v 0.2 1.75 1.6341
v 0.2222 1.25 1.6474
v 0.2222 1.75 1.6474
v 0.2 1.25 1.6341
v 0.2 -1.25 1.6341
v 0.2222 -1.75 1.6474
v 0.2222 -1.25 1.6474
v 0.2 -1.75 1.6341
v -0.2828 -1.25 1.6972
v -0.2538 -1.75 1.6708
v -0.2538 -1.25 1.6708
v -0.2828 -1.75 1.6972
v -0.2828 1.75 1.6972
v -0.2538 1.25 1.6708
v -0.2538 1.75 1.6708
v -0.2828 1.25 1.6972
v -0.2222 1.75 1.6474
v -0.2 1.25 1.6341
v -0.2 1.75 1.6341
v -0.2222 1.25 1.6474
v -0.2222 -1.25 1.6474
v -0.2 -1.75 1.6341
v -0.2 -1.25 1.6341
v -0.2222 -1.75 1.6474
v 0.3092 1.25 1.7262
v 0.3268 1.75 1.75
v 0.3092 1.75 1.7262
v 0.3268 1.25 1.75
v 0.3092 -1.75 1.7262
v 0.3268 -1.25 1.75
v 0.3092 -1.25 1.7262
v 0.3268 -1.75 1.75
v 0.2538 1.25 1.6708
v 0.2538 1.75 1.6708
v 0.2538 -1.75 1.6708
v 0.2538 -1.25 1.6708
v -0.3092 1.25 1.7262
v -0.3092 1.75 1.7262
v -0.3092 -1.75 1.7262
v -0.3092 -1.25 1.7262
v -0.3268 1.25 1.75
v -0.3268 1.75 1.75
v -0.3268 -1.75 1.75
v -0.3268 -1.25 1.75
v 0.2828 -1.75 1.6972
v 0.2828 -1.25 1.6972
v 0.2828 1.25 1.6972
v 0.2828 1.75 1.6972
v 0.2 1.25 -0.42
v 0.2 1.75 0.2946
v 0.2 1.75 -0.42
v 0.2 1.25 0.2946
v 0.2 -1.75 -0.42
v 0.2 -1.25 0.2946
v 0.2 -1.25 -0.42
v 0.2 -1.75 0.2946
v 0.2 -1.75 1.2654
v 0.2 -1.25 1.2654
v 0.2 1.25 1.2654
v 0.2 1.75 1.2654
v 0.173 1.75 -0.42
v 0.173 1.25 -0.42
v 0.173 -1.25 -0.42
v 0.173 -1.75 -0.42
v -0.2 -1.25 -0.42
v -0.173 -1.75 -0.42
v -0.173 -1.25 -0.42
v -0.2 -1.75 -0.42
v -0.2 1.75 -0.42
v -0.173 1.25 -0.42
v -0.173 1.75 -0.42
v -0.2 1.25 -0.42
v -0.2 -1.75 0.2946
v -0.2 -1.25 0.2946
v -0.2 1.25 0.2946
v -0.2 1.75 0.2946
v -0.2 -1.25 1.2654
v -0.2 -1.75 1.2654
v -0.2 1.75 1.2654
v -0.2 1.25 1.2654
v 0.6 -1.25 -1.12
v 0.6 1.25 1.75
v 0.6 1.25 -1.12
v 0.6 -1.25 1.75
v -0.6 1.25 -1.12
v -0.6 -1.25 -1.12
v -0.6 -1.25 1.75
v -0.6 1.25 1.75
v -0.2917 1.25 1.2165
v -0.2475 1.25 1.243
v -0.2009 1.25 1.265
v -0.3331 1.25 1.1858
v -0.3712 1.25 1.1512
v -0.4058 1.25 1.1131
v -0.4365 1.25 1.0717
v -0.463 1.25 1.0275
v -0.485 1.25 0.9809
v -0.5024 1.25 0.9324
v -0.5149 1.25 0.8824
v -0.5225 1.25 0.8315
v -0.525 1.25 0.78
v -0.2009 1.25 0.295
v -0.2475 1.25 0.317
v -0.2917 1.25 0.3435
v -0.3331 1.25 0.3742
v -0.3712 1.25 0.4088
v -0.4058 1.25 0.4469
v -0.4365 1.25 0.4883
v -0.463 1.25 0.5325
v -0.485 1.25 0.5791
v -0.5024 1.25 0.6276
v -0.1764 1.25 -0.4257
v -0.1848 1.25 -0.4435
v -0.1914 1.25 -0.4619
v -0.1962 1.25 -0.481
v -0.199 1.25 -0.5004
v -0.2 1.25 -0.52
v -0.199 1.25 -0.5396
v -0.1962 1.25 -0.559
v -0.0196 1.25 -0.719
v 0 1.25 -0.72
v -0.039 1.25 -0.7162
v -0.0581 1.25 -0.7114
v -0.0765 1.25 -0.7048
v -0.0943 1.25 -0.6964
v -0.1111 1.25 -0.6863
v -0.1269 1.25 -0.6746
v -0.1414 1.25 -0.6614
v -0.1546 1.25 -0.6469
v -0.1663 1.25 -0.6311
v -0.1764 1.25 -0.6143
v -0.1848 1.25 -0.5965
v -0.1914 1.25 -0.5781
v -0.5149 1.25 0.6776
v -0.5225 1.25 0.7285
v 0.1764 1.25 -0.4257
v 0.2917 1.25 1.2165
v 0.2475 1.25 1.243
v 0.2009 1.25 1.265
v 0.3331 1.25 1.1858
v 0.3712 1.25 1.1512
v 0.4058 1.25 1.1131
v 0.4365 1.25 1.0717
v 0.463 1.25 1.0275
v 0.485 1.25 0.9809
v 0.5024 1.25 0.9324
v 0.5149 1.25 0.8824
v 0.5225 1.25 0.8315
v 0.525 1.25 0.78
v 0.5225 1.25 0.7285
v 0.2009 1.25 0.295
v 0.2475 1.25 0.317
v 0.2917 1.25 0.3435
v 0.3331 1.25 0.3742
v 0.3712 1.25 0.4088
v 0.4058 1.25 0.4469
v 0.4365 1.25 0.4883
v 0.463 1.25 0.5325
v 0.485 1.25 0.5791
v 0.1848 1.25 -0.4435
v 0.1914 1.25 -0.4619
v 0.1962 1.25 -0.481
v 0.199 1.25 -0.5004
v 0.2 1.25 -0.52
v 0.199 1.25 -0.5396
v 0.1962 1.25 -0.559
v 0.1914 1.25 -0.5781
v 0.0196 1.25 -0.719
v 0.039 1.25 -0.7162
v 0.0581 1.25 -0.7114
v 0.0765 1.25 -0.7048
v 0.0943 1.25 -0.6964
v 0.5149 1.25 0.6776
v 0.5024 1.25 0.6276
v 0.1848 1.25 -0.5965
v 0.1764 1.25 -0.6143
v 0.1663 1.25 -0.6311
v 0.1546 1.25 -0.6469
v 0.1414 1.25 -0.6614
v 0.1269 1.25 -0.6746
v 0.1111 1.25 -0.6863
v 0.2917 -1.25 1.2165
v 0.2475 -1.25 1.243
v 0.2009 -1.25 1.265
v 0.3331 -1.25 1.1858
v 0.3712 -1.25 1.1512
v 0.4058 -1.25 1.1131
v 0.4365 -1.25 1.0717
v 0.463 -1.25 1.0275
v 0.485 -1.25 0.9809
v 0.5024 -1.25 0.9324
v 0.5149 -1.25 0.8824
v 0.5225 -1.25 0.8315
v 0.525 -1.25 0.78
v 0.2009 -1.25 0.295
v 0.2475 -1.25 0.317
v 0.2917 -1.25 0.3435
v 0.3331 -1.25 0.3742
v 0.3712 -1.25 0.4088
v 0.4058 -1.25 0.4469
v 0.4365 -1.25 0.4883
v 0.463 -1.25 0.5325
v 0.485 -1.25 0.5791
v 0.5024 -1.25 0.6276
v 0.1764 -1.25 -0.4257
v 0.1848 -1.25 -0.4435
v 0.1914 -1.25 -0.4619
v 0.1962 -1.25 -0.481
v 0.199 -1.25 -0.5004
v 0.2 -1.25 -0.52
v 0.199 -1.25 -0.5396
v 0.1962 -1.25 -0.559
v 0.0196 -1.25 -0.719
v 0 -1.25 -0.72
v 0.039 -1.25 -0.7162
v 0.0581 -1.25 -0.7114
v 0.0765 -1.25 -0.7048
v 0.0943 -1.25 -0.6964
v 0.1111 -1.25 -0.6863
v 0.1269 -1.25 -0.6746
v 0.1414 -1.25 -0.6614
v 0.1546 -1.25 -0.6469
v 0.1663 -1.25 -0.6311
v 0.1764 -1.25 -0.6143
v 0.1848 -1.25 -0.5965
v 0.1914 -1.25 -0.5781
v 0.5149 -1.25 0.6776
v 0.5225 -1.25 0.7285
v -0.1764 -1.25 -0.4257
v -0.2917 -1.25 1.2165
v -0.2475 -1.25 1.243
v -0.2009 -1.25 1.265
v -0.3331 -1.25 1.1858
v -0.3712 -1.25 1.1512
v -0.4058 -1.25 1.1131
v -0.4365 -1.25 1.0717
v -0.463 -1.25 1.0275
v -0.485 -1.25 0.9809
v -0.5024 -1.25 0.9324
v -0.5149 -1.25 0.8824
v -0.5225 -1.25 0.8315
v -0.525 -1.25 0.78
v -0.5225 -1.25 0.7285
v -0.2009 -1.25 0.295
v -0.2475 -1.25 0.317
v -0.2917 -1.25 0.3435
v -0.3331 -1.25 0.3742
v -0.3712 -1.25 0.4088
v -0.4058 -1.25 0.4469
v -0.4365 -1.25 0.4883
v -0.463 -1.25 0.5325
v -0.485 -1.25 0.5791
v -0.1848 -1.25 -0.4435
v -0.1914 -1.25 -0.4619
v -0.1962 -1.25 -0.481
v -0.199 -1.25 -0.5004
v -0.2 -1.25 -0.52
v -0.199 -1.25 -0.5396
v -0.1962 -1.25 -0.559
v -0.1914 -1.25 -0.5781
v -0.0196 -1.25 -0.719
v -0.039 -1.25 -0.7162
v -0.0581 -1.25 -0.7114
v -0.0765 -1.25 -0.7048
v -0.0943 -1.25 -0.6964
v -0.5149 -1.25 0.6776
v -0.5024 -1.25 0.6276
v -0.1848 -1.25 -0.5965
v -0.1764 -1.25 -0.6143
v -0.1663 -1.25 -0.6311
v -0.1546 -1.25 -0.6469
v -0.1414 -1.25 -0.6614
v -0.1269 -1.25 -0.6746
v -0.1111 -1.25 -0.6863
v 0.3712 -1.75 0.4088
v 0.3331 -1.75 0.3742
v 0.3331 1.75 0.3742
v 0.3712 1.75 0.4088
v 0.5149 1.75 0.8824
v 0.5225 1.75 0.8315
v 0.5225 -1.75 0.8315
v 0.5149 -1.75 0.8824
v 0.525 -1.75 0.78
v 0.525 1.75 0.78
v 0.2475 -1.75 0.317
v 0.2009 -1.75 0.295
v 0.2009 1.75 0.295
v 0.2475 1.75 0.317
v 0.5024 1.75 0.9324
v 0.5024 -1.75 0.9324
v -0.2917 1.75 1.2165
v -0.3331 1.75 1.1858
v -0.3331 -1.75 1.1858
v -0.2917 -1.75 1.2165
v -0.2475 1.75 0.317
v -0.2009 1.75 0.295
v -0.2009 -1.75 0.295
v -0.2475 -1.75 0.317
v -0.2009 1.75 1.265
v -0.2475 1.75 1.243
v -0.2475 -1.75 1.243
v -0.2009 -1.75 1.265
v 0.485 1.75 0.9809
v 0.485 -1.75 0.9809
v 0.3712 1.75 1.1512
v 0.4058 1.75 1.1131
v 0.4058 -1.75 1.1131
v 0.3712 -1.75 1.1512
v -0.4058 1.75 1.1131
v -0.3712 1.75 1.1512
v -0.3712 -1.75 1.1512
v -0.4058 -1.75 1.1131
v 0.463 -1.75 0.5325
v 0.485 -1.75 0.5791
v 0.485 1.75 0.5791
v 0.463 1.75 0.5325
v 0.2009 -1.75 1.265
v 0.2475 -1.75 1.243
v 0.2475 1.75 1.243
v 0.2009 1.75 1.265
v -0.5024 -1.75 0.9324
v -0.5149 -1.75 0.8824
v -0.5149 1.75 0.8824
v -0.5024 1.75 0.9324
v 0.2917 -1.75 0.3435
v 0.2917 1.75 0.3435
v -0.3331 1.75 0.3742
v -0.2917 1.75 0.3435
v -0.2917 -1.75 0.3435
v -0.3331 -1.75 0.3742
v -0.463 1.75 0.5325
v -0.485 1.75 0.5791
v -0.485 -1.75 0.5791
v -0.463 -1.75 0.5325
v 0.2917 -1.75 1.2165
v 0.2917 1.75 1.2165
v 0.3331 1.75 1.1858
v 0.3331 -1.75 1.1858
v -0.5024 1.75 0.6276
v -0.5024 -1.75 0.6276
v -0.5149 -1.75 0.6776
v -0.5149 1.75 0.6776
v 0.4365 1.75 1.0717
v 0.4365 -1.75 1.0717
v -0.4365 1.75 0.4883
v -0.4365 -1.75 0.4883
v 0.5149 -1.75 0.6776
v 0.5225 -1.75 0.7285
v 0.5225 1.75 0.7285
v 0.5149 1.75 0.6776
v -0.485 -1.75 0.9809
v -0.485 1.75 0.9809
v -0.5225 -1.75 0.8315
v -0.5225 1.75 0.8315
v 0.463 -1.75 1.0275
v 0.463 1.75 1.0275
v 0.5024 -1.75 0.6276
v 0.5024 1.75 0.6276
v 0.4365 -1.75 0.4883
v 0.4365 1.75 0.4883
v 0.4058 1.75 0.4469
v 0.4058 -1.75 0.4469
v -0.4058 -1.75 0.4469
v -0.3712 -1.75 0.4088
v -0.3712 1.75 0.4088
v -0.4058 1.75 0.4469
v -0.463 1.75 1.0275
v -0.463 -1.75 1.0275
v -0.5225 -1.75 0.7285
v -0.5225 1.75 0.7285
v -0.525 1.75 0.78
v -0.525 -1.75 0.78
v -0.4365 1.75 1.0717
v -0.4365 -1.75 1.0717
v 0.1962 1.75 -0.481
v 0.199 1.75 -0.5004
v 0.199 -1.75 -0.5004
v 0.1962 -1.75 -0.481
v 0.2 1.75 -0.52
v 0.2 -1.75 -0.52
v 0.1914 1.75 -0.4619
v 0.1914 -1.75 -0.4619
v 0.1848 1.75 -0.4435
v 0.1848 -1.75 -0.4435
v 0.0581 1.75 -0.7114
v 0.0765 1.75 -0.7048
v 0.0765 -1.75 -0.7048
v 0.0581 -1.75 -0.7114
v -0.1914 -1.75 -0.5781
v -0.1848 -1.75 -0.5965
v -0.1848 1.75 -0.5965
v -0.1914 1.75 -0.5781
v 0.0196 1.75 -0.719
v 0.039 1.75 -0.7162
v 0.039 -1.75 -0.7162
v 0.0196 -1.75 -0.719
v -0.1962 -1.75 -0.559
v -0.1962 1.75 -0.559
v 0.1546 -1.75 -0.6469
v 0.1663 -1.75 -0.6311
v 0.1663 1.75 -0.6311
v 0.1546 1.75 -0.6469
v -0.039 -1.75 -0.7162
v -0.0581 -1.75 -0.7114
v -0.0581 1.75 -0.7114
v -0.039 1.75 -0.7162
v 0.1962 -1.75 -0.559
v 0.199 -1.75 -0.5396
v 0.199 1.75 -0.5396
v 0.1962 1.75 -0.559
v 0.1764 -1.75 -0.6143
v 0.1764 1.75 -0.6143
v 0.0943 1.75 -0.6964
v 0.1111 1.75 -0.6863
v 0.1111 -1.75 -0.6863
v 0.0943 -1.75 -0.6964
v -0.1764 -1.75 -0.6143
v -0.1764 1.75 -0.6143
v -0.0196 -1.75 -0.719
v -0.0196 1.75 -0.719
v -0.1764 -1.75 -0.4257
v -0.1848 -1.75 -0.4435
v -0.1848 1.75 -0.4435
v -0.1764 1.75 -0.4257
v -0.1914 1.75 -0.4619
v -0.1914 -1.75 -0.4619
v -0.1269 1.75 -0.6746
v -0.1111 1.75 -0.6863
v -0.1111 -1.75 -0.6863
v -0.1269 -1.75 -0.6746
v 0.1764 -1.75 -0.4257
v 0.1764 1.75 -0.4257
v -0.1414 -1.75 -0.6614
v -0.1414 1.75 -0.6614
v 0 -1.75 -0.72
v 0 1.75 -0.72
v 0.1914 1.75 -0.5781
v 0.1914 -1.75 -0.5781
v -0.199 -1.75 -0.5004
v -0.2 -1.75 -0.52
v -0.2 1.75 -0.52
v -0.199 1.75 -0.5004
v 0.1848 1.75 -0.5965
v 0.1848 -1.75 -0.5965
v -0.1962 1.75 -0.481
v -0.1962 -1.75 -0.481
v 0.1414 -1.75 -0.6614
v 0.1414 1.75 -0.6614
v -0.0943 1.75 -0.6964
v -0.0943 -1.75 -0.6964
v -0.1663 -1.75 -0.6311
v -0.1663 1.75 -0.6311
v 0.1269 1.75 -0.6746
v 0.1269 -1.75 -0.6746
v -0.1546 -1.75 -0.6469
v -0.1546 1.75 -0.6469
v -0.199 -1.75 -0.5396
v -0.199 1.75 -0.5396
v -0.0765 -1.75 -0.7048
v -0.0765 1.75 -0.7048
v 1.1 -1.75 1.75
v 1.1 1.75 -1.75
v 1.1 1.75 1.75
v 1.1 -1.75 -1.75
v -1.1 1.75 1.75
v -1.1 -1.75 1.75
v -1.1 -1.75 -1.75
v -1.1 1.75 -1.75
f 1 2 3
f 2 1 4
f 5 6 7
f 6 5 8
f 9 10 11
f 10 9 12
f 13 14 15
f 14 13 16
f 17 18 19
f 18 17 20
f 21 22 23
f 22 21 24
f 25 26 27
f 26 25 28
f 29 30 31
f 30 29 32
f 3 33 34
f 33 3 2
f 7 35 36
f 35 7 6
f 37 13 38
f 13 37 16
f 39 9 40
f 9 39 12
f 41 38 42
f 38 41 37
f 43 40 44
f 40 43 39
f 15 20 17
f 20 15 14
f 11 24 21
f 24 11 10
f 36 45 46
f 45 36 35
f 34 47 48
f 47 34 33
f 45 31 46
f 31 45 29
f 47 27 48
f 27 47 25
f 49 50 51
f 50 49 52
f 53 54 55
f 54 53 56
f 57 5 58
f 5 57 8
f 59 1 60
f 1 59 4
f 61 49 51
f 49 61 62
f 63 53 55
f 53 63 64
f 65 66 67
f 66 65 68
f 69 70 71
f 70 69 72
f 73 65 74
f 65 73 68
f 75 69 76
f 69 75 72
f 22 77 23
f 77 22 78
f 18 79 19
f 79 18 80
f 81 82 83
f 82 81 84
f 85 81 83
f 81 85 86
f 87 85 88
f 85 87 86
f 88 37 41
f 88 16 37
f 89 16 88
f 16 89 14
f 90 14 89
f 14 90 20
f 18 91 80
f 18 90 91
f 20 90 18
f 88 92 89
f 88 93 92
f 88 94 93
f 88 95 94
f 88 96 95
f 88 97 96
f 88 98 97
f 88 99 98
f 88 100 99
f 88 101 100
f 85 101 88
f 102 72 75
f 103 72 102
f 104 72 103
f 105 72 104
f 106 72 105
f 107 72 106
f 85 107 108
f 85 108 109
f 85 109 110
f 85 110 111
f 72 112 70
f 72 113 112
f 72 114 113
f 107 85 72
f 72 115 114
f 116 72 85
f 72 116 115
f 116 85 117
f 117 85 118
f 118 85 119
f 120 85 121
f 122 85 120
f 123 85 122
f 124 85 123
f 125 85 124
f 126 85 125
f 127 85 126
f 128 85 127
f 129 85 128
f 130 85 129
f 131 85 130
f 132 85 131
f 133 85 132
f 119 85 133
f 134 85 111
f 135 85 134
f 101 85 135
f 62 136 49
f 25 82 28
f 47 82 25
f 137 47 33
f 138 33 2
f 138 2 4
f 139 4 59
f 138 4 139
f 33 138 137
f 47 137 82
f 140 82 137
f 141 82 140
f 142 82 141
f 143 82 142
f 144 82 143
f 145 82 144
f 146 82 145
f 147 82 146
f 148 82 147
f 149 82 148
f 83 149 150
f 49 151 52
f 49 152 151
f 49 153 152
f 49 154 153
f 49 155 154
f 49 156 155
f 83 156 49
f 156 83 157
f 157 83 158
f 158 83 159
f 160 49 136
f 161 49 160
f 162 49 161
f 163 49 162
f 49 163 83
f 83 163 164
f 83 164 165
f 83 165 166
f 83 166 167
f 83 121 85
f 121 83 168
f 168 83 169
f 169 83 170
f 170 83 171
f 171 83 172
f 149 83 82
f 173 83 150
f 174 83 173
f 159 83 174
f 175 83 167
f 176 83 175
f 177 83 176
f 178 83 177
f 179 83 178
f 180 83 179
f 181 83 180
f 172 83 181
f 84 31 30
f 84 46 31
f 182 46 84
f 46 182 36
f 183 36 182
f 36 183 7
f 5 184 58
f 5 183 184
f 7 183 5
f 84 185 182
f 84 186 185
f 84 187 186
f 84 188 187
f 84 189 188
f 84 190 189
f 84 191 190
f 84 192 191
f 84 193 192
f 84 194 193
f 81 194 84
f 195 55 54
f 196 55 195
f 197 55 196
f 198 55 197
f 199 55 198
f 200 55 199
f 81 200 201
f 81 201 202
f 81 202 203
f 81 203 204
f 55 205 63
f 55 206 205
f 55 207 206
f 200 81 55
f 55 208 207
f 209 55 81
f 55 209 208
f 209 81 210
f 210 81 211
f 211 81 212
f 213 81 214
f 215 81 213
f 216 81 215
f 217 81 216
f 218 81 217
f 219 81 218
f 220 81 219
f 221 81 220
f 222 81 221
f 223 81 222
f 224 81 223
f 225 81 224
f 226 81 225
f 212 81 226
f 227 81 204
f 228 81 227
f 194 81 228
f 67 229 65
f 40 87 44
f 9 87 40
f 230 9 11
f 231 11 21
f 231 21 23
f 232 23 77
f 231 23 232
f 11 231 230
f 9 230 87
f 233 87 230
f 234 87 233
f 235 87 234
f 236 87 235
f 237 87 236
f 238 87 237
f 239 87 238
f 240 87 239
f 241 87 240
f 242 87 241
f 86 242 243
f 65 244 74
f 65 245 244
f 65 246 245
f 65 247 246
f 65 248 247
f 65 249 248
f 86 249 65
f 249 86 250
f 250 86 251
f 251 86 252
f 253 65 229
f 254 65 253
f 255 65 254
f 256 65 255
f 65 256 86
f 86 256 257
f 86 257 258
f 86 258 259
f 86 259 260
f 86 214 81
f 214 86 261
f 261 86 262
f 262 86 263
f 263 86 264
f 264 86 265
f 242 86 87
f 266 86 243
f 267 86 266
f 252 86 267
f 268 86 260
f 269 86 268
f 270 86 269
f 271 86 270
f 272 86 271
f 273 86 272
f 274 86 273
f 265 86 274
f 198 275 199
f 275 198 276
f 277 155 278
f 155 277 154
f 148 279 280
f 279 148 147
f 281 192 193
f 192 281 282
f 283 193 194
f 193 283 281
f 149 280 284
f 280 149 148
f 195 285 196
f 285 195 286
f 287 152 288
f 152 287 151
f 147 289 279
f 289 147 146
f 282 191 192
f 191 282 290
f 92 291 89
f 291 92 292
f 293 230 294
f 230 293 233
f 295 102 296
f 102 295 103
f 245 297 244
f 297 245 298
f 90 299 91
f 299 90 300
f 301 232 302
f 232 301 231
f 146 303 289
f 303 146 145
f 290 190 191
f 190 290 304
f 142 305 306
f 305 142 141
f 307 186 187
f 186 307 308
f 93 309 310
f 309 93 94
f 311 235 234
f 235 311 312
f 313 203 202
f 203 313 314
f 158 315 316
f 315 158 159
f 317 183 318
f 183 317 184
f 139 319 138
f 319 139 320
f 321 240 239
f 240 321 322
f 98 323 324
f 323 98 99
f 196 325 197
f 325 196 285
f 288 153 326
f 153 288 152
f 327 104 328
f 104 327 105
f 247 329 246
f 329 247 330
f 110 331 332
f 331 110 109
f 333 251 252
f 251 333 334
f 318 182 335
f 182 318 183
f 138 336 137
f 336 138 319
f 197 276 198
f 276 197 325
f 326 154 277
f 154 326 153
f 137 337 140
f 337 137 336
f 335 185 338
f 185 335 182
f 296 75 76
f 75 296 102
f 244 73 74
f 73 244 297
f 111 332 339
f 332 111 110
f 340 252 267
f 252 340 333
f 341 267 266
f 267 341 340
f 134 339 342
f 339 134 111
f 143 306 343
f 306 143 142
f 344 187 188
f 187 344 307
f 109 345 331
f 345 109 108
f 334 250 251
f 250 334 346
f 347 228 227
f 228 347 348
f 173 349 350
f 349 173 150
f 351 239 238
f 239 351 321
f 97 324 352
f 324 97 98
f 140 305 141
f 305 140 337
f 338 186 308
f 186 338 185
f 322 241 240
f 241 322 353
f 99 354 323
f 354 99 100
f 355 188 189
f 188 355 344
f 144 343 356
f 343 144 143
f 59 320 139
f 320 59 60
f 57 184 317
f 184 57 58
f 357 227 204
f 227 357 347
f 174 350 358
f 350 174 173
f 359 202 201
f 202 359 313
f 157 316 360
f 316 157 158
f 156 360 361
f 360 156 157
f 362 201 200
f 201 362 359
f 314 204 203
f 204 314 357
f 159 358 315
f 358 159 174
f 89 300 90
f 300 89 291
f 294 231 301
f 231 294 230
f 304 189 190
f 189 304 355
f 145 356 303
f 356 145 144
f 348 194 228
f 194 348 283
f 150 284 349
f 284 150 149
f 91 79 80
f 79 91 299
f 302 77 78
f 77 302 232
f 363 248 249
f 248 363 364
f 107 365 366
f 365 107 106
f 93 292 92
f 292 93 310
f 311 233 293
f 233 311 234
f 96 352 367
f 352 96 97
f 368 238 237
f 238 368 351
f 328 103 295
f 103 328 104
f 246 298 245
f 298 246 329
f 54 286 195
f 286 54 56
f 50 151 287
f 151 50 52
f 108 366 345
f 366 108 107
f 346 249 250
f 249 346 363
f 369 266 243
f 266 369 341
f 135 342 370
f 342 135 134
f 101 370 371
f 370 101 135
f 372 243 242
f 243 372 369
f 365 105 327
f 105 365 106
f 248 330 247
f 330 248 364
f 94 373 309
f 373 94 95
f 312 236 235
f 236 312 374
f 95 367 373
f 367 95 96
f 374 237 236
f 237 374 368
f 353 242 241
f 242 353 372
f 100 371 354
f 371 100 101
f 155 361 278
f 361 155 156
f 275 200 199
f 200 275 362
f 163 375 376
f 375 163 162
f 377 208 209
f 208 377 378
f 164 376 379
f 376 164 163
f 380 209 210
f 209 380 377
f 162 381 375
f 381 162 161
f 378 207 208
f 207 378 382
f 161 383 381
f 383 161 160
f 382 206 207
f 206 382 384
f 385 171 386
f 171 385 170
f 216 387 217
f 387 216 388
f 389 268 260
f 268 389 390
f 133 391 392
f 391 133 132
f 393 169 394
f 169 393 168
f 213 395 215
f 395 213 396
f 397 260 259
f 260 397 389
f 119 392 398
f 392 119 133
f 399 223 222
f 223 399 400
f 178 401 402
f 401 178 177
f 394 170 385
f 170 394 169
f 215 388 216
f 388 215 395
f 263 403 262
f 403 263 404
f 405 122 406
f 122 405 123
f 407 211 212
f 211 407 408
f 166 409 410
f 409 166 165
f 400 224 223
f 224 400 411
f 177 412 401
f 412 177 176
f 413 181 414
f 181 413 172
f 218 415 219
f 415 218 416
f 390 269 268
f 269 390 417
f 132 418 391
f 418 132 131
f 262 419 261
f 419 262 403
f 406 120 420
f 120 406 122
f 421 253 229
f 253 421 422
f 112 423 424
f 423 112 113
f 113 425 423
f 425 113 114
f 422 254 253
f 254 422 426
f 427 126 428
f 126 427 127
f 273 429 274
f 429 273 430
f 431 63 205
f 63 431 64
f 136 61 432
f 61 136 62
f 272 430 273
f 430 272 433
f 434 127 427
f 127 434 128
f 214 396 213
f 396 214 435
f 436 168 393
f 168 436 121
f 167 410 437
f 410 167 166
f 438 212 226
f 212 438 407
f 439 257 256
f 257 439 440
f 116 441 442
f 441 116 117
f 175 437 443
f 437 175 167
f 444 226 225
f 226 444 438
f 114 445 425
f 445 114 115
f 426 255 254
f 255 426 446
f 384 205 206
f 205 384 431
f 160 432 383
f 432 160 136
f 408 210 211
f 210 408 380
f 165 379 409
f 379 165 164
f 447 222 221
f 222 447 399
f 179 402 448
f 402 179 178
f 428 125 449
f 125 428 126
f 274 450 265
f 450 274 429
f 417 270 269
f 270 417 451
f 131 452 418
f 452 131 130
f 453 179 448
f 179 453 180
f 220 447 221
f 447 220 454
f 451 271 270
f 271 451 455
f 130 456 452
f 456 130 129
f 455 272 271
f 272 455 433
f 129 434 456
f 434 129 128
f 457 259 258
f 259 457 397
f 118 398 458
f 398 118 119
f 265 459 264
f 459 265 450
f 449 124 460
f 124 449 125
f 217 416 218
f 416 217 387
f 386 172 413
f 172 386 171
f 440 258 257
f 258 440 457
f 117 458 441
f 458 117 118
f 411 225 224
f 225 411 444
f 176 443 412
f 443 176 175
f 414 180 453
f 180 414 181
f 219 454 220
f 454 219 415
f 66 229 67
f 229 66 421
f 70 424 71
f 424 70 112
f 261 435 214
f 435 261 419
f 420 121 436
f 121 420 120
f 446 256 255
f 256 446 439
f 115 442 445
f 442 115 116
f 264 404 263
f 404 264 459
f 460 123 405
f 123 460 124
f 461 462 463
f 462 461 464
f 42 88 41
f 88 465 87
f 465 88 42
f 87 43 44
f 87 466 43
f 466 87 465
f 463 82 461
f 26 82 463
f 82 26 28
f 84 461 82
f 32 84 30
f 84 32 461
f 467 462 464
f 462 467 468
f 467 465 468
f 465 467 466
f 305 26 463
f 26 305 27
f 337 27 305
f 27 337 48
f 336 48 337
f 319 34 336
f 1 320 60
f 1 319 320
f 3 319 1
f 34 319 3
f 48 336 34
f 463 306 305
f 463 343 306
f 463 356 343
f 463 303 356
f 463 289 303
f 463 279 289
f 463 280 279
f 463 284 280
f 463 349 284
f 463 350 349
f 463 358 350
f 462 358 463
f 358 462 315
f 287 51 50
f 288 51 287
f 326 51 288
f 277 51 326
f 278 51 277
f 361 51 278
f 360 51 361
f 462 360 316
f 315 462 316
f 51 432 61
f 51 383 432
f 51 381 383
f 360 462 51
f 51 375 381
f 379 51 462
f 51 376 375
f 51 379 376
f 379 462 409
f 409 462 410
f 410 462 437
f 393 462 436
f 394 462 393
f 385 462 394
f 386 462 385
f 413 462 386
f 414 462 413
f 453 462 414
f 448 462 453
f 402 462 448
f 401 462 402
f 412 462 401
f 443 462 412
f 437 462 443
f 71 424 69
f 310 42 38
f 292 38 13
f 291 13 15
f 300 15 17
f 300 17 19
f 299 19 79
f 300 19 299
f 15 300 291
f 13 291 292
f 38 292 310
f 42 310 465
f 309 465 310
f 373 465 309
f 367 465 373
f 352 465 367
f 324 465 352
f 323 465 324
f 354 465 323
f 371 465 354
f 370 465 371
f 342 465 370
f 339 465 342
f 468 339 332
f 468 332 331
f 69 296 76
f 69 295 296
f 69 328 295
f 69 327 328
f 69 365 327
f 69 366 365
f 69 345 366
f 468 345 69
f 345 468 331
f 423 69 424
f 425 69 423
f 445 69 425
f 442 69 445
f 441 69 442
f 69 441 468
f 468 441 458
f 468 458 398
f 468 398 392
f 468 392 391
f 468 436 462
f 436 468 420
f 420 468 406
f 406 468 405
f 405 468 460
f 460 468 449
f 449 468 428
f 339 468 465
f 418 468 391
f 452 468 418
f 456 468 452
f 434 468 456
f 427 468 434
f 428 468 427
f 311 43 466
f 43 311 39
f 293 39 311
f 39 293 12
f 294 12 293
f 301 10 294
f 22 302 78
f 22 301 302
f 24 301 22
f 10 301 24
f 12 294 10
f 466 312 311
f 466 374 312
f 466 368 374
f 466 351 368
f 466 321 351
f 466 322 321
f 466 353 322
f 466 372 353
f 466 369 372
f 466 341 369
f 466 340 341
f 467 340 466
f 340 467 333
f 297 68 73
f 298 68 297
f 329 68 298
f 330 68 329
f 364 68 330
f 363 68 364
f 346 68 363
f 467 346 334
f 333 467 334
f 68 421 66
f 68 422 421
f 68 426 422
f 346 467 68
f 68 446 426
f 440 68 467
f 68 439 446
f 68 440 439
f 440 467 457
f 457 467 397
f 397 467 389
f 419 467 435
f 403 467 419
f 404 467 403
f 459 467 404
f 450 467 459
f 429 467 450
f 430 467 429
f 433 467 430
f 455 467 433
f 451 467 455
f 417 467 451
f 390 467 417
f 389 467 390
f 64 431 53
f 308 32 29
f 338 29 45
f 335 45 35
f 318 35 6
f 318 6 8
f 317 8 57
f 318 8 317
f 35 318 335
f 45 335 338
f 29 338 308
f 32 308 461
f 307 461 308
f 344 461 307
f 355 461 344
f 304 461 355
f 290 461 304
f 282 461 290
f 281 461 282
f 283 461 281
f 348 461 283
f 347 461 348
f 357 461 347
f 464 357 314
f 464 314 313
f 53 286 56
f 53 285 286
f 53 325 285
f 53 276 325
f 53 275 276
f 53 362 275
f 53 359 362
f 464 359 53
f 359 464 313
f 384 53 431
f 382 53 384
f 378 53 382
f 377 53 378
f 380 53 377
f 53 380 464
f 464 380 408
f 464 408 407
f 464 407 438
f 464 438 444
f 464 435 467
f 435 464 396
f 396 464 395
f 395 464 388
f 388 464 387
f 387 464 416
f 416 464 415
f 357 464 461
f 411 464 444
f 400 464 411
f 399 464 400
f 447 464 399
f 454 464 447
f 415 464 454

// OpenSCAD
module coupling_body()
{
	difference() {
	rotate([45,0,0])
	cube([3.8, 1.42 * 1.4, 1.42 * 1.4]);
	translate([0, -1.4, 1.9])
		cube([3.8,3, 2]);
	}
	translate([0,-1.4, 1.4])
		cube([3.8, 0.7,0.5]);

	// End of ARM
	translate([0.25, 0, 1.9])
	difference() {
		cube([0.5, 2.8, 1.0], center = true);
		translate([0,0,2.0])
		rotate([45,0,0])
			cube([0.5, 2.8, 2.8], center = true);
	}
	translate([3.1 + 0.35, 0 , 2.9]) {
		difference() {
		cube([0.7, 2.8, 5.8], center=true);
		translate([0.35, 0, -5.0])
		rotate([0,-15,0])
			cube([0.7, 2.8, 7.8], center=true);
		translate([0, 0, -4.5])
		rotate([45, 0, 0])
			cube([1.1, 5, 1], center=true);
		}
	}
	translate([0.6, 0,5.3])
	difference() {
		cube([6.4, 2.8, 1.0], center=true);
		translate([-4.8,0,0.1])
		rotate([0, -15, 0])
		cube([8.4, 2.8, 1.0], center=true);
	}
}


module test_coupling()
{
	coupling_body();
	translate([3.3 - 2.6,-0.5,5.5])
		cube([1,1, 10]);
}

module nem_pocket_hole(w)
{
	cube([0.4, 4.2, 2.2], center=true);
   translate([0,0,-0.7])
		cube([1.2, w , 2.2], center=true);
	translate([0, 0, 0.6])
	cube([0.4, 4.2, 1], center=true);
	translate([0, 0, 0.1])
		rotate([90,0,0])
			cylinder(h=4.2, r=1.05/2, $fn=64, center=true);
	translate([0, 0, -1.2])
		rotate([90,0,0])
			cylinder(h=4.2, r=0.2, $fn=64, center=true);
	difference() {
		translate([0, 0, 1.3])
			rotate([90,0,0])
				cylinder(h=4.2, r=0.8/2, $fn=64, center=true);
		translate([0,0, 2.6])
			cube([2.3, 4.25, 3], center=true);
	}
	cube([1.2, w, 2.2], center=true);
}

module nem_pocket_body()
{
	cube([3.0, 4, 3.5], center=true);
}


module nem_pocket()
{
	difference()
	{
		nem_pocket_body();
		translate([0,0,0.68])
		nem_pocket_hole(2.5);
	}
}

module nem_pocket_wide()
{
	difference()
	{
		nem_pocket_body();
		translate([0,0,0.68])
		nem_pocket_hole(2.7);
	}
}

module fud_nem_pocket_body(w)
{
	cube([2.2, w + 1, 3.5], center=true);
}


module fud_nem_pocket()
{
	difference()
	{
		fud_nem_pocket_body(2.5);
		translate([0,0,0.68])
		nem_pocket_hole(2.5);
	}
}

module fud_nem_pocket_wide()
{
	difference()
	{
		fud_nem_pocket_body(2.5);
		translate([0,0,0.68])
		nem_pocket_hole(2.7);
	}
}
//nem_pocket();


// Our buffers are 4mm long so the front face of the box
// should be 1mm in front of the buffer beam.
// The centre line of the box should be 4mm above the rai

module nem_close_coupler_arm(a, s)
{
	n = 5;	// Fixme compute this
	cube([1, s, a], center=true);
	translate([0,0, a /2 + n /2])
		difference() {
			union() {
				cube([1, 3, n], center=true);
				translate([0, 0, n/2])
				rotate([0,90,0])
					cylinder(r = 1.5, h=1, center=true, $fn=64);
			}

		}

	// Fixme locate pin correctly
	translate([1.6,0, -n/2])
	rotate([0,90,0]) {
		cylinder(r=0.5, h=2.5, center=true, $fn=64);
		translate([0,0,0.25])
			cylinder(r2=0.6, r1=0.75, h=1, $fn=64);
	}
	// Fixme locate pin correctly
	translate([1.5,0, n + a/2 - 1.2])
	rotate([0,90,0]) {
		cylinder(r=0.6, h=2.5, center=true, $fn=64);
		translate([0,0,0.4])
			cylinder(r2=0.6, r1=0.85, h=0.85, $fn=64);
	}	// Fixme - and make it a split pin or similar ?
}

//
//	Generate the reference block of bodywork. We need to
// amend this so that we put a block for the coupling
//	bar to hold against and a plug in pin. Ultimately
// we will need to make the bar itself cranked to clear
// the bogies or hang the NEM pocket below ?
//
module nem_close_coupler_bodywork(a, s)
{
	// Fixme - compute n, also correct so that end not
	// centre of coupling hole is aligned with centre dip
	// worst case of slot
	n = 5;

	difference() {
		translate([1.3,0,0])
			cube([1, 16,25], center=true);
		translate([1.5, 0, n/2]) {
			rotate([0,90,0])
					cylinder(r = 0.65, h=5, center=true, $fn=64);
			cube([1.5, 1.5, n-3], center=true);
			translate([0, 0, (n-3)/2 + 0.3])
			rotate([0,90,0])
				cylinder(r=0.85, h=4, center=true, $fn=64);
			translate([0, 0, -(n-3)/2])
				rotate([0,90,0])
					cylinder(r=0.75, h=4, center=true, $fn=64);				}
	}
}

//
//	Plot a segment of the curve (see NEM352)
//
module nem_close_coupler_slot_segment(a, e, s, p, m)
{
	k = a - (p + m);
	translate([0,-e,0]) {
	difference() {
		cylinder(h=1.02, r=k, center=true, $fn=64);
		cylinder(h=1.02, r=k-1.2, center=true, $fn=64);
		translate([0,-k/2,0])
			cube([2*k, k, 1.05], center=true);
		translate([-k/2, k/2, 0])
			cube([k, k, 1.05], center = true);
		translate([0, e+k/2, 0])
			cube([2*k, k, 1.05], center=true);
		}
	}
}

//
//	Plot the curves as per NEM352. We assume our input
// is sensible. Given too low a value of A our arcs
// may well be fine mathematically but they won't be
// useful
// ASSUMPTIONS: B = E (spec allows B >= E)
//
module nem_close_coupler_slots(a,e,s,p,m)
{
	rotate([0,90,0]) {
		translate([0,0.01,0])
		nem_close_coupler_slot_segment(a,e,s,p,m);
		mirror([0,1,0])
			nem_close_coupler_slot_segment(a,e,s,p,m);
	}
}

//	A - distance from end point to centre of arcs
// E - buffer outside to centre line (~ 7-7.5mm)
// S - width of coupler
// M - distance between coach end and guide
// P - distance between buffers and coach end (~4mm)
//     (we include the D factor from the spec here)
// 
module nem_close_coupler(a, e, s, p, m)
{
	difference() {
	   nem_close_coupler_bodywork(a, s);
		translate([1.3,0,m])
			nem_close_coupler_slots(a, e, s, p, m);
	}

//	translate([3,0,0]) {
		translate([0,0,-a/2])
   		nem_close_coupler_arm(a, s);

		translate([-1.5,0,-a])
			rotate([180,0,0])
				nem_pocket();
//	}
}


// nem_close_coupler(25, 7, 2.5, 4, 2);
//nem_close_coupler(16, 7, 1.5, 4, 2);

fud_nem_pocket(2.5);
